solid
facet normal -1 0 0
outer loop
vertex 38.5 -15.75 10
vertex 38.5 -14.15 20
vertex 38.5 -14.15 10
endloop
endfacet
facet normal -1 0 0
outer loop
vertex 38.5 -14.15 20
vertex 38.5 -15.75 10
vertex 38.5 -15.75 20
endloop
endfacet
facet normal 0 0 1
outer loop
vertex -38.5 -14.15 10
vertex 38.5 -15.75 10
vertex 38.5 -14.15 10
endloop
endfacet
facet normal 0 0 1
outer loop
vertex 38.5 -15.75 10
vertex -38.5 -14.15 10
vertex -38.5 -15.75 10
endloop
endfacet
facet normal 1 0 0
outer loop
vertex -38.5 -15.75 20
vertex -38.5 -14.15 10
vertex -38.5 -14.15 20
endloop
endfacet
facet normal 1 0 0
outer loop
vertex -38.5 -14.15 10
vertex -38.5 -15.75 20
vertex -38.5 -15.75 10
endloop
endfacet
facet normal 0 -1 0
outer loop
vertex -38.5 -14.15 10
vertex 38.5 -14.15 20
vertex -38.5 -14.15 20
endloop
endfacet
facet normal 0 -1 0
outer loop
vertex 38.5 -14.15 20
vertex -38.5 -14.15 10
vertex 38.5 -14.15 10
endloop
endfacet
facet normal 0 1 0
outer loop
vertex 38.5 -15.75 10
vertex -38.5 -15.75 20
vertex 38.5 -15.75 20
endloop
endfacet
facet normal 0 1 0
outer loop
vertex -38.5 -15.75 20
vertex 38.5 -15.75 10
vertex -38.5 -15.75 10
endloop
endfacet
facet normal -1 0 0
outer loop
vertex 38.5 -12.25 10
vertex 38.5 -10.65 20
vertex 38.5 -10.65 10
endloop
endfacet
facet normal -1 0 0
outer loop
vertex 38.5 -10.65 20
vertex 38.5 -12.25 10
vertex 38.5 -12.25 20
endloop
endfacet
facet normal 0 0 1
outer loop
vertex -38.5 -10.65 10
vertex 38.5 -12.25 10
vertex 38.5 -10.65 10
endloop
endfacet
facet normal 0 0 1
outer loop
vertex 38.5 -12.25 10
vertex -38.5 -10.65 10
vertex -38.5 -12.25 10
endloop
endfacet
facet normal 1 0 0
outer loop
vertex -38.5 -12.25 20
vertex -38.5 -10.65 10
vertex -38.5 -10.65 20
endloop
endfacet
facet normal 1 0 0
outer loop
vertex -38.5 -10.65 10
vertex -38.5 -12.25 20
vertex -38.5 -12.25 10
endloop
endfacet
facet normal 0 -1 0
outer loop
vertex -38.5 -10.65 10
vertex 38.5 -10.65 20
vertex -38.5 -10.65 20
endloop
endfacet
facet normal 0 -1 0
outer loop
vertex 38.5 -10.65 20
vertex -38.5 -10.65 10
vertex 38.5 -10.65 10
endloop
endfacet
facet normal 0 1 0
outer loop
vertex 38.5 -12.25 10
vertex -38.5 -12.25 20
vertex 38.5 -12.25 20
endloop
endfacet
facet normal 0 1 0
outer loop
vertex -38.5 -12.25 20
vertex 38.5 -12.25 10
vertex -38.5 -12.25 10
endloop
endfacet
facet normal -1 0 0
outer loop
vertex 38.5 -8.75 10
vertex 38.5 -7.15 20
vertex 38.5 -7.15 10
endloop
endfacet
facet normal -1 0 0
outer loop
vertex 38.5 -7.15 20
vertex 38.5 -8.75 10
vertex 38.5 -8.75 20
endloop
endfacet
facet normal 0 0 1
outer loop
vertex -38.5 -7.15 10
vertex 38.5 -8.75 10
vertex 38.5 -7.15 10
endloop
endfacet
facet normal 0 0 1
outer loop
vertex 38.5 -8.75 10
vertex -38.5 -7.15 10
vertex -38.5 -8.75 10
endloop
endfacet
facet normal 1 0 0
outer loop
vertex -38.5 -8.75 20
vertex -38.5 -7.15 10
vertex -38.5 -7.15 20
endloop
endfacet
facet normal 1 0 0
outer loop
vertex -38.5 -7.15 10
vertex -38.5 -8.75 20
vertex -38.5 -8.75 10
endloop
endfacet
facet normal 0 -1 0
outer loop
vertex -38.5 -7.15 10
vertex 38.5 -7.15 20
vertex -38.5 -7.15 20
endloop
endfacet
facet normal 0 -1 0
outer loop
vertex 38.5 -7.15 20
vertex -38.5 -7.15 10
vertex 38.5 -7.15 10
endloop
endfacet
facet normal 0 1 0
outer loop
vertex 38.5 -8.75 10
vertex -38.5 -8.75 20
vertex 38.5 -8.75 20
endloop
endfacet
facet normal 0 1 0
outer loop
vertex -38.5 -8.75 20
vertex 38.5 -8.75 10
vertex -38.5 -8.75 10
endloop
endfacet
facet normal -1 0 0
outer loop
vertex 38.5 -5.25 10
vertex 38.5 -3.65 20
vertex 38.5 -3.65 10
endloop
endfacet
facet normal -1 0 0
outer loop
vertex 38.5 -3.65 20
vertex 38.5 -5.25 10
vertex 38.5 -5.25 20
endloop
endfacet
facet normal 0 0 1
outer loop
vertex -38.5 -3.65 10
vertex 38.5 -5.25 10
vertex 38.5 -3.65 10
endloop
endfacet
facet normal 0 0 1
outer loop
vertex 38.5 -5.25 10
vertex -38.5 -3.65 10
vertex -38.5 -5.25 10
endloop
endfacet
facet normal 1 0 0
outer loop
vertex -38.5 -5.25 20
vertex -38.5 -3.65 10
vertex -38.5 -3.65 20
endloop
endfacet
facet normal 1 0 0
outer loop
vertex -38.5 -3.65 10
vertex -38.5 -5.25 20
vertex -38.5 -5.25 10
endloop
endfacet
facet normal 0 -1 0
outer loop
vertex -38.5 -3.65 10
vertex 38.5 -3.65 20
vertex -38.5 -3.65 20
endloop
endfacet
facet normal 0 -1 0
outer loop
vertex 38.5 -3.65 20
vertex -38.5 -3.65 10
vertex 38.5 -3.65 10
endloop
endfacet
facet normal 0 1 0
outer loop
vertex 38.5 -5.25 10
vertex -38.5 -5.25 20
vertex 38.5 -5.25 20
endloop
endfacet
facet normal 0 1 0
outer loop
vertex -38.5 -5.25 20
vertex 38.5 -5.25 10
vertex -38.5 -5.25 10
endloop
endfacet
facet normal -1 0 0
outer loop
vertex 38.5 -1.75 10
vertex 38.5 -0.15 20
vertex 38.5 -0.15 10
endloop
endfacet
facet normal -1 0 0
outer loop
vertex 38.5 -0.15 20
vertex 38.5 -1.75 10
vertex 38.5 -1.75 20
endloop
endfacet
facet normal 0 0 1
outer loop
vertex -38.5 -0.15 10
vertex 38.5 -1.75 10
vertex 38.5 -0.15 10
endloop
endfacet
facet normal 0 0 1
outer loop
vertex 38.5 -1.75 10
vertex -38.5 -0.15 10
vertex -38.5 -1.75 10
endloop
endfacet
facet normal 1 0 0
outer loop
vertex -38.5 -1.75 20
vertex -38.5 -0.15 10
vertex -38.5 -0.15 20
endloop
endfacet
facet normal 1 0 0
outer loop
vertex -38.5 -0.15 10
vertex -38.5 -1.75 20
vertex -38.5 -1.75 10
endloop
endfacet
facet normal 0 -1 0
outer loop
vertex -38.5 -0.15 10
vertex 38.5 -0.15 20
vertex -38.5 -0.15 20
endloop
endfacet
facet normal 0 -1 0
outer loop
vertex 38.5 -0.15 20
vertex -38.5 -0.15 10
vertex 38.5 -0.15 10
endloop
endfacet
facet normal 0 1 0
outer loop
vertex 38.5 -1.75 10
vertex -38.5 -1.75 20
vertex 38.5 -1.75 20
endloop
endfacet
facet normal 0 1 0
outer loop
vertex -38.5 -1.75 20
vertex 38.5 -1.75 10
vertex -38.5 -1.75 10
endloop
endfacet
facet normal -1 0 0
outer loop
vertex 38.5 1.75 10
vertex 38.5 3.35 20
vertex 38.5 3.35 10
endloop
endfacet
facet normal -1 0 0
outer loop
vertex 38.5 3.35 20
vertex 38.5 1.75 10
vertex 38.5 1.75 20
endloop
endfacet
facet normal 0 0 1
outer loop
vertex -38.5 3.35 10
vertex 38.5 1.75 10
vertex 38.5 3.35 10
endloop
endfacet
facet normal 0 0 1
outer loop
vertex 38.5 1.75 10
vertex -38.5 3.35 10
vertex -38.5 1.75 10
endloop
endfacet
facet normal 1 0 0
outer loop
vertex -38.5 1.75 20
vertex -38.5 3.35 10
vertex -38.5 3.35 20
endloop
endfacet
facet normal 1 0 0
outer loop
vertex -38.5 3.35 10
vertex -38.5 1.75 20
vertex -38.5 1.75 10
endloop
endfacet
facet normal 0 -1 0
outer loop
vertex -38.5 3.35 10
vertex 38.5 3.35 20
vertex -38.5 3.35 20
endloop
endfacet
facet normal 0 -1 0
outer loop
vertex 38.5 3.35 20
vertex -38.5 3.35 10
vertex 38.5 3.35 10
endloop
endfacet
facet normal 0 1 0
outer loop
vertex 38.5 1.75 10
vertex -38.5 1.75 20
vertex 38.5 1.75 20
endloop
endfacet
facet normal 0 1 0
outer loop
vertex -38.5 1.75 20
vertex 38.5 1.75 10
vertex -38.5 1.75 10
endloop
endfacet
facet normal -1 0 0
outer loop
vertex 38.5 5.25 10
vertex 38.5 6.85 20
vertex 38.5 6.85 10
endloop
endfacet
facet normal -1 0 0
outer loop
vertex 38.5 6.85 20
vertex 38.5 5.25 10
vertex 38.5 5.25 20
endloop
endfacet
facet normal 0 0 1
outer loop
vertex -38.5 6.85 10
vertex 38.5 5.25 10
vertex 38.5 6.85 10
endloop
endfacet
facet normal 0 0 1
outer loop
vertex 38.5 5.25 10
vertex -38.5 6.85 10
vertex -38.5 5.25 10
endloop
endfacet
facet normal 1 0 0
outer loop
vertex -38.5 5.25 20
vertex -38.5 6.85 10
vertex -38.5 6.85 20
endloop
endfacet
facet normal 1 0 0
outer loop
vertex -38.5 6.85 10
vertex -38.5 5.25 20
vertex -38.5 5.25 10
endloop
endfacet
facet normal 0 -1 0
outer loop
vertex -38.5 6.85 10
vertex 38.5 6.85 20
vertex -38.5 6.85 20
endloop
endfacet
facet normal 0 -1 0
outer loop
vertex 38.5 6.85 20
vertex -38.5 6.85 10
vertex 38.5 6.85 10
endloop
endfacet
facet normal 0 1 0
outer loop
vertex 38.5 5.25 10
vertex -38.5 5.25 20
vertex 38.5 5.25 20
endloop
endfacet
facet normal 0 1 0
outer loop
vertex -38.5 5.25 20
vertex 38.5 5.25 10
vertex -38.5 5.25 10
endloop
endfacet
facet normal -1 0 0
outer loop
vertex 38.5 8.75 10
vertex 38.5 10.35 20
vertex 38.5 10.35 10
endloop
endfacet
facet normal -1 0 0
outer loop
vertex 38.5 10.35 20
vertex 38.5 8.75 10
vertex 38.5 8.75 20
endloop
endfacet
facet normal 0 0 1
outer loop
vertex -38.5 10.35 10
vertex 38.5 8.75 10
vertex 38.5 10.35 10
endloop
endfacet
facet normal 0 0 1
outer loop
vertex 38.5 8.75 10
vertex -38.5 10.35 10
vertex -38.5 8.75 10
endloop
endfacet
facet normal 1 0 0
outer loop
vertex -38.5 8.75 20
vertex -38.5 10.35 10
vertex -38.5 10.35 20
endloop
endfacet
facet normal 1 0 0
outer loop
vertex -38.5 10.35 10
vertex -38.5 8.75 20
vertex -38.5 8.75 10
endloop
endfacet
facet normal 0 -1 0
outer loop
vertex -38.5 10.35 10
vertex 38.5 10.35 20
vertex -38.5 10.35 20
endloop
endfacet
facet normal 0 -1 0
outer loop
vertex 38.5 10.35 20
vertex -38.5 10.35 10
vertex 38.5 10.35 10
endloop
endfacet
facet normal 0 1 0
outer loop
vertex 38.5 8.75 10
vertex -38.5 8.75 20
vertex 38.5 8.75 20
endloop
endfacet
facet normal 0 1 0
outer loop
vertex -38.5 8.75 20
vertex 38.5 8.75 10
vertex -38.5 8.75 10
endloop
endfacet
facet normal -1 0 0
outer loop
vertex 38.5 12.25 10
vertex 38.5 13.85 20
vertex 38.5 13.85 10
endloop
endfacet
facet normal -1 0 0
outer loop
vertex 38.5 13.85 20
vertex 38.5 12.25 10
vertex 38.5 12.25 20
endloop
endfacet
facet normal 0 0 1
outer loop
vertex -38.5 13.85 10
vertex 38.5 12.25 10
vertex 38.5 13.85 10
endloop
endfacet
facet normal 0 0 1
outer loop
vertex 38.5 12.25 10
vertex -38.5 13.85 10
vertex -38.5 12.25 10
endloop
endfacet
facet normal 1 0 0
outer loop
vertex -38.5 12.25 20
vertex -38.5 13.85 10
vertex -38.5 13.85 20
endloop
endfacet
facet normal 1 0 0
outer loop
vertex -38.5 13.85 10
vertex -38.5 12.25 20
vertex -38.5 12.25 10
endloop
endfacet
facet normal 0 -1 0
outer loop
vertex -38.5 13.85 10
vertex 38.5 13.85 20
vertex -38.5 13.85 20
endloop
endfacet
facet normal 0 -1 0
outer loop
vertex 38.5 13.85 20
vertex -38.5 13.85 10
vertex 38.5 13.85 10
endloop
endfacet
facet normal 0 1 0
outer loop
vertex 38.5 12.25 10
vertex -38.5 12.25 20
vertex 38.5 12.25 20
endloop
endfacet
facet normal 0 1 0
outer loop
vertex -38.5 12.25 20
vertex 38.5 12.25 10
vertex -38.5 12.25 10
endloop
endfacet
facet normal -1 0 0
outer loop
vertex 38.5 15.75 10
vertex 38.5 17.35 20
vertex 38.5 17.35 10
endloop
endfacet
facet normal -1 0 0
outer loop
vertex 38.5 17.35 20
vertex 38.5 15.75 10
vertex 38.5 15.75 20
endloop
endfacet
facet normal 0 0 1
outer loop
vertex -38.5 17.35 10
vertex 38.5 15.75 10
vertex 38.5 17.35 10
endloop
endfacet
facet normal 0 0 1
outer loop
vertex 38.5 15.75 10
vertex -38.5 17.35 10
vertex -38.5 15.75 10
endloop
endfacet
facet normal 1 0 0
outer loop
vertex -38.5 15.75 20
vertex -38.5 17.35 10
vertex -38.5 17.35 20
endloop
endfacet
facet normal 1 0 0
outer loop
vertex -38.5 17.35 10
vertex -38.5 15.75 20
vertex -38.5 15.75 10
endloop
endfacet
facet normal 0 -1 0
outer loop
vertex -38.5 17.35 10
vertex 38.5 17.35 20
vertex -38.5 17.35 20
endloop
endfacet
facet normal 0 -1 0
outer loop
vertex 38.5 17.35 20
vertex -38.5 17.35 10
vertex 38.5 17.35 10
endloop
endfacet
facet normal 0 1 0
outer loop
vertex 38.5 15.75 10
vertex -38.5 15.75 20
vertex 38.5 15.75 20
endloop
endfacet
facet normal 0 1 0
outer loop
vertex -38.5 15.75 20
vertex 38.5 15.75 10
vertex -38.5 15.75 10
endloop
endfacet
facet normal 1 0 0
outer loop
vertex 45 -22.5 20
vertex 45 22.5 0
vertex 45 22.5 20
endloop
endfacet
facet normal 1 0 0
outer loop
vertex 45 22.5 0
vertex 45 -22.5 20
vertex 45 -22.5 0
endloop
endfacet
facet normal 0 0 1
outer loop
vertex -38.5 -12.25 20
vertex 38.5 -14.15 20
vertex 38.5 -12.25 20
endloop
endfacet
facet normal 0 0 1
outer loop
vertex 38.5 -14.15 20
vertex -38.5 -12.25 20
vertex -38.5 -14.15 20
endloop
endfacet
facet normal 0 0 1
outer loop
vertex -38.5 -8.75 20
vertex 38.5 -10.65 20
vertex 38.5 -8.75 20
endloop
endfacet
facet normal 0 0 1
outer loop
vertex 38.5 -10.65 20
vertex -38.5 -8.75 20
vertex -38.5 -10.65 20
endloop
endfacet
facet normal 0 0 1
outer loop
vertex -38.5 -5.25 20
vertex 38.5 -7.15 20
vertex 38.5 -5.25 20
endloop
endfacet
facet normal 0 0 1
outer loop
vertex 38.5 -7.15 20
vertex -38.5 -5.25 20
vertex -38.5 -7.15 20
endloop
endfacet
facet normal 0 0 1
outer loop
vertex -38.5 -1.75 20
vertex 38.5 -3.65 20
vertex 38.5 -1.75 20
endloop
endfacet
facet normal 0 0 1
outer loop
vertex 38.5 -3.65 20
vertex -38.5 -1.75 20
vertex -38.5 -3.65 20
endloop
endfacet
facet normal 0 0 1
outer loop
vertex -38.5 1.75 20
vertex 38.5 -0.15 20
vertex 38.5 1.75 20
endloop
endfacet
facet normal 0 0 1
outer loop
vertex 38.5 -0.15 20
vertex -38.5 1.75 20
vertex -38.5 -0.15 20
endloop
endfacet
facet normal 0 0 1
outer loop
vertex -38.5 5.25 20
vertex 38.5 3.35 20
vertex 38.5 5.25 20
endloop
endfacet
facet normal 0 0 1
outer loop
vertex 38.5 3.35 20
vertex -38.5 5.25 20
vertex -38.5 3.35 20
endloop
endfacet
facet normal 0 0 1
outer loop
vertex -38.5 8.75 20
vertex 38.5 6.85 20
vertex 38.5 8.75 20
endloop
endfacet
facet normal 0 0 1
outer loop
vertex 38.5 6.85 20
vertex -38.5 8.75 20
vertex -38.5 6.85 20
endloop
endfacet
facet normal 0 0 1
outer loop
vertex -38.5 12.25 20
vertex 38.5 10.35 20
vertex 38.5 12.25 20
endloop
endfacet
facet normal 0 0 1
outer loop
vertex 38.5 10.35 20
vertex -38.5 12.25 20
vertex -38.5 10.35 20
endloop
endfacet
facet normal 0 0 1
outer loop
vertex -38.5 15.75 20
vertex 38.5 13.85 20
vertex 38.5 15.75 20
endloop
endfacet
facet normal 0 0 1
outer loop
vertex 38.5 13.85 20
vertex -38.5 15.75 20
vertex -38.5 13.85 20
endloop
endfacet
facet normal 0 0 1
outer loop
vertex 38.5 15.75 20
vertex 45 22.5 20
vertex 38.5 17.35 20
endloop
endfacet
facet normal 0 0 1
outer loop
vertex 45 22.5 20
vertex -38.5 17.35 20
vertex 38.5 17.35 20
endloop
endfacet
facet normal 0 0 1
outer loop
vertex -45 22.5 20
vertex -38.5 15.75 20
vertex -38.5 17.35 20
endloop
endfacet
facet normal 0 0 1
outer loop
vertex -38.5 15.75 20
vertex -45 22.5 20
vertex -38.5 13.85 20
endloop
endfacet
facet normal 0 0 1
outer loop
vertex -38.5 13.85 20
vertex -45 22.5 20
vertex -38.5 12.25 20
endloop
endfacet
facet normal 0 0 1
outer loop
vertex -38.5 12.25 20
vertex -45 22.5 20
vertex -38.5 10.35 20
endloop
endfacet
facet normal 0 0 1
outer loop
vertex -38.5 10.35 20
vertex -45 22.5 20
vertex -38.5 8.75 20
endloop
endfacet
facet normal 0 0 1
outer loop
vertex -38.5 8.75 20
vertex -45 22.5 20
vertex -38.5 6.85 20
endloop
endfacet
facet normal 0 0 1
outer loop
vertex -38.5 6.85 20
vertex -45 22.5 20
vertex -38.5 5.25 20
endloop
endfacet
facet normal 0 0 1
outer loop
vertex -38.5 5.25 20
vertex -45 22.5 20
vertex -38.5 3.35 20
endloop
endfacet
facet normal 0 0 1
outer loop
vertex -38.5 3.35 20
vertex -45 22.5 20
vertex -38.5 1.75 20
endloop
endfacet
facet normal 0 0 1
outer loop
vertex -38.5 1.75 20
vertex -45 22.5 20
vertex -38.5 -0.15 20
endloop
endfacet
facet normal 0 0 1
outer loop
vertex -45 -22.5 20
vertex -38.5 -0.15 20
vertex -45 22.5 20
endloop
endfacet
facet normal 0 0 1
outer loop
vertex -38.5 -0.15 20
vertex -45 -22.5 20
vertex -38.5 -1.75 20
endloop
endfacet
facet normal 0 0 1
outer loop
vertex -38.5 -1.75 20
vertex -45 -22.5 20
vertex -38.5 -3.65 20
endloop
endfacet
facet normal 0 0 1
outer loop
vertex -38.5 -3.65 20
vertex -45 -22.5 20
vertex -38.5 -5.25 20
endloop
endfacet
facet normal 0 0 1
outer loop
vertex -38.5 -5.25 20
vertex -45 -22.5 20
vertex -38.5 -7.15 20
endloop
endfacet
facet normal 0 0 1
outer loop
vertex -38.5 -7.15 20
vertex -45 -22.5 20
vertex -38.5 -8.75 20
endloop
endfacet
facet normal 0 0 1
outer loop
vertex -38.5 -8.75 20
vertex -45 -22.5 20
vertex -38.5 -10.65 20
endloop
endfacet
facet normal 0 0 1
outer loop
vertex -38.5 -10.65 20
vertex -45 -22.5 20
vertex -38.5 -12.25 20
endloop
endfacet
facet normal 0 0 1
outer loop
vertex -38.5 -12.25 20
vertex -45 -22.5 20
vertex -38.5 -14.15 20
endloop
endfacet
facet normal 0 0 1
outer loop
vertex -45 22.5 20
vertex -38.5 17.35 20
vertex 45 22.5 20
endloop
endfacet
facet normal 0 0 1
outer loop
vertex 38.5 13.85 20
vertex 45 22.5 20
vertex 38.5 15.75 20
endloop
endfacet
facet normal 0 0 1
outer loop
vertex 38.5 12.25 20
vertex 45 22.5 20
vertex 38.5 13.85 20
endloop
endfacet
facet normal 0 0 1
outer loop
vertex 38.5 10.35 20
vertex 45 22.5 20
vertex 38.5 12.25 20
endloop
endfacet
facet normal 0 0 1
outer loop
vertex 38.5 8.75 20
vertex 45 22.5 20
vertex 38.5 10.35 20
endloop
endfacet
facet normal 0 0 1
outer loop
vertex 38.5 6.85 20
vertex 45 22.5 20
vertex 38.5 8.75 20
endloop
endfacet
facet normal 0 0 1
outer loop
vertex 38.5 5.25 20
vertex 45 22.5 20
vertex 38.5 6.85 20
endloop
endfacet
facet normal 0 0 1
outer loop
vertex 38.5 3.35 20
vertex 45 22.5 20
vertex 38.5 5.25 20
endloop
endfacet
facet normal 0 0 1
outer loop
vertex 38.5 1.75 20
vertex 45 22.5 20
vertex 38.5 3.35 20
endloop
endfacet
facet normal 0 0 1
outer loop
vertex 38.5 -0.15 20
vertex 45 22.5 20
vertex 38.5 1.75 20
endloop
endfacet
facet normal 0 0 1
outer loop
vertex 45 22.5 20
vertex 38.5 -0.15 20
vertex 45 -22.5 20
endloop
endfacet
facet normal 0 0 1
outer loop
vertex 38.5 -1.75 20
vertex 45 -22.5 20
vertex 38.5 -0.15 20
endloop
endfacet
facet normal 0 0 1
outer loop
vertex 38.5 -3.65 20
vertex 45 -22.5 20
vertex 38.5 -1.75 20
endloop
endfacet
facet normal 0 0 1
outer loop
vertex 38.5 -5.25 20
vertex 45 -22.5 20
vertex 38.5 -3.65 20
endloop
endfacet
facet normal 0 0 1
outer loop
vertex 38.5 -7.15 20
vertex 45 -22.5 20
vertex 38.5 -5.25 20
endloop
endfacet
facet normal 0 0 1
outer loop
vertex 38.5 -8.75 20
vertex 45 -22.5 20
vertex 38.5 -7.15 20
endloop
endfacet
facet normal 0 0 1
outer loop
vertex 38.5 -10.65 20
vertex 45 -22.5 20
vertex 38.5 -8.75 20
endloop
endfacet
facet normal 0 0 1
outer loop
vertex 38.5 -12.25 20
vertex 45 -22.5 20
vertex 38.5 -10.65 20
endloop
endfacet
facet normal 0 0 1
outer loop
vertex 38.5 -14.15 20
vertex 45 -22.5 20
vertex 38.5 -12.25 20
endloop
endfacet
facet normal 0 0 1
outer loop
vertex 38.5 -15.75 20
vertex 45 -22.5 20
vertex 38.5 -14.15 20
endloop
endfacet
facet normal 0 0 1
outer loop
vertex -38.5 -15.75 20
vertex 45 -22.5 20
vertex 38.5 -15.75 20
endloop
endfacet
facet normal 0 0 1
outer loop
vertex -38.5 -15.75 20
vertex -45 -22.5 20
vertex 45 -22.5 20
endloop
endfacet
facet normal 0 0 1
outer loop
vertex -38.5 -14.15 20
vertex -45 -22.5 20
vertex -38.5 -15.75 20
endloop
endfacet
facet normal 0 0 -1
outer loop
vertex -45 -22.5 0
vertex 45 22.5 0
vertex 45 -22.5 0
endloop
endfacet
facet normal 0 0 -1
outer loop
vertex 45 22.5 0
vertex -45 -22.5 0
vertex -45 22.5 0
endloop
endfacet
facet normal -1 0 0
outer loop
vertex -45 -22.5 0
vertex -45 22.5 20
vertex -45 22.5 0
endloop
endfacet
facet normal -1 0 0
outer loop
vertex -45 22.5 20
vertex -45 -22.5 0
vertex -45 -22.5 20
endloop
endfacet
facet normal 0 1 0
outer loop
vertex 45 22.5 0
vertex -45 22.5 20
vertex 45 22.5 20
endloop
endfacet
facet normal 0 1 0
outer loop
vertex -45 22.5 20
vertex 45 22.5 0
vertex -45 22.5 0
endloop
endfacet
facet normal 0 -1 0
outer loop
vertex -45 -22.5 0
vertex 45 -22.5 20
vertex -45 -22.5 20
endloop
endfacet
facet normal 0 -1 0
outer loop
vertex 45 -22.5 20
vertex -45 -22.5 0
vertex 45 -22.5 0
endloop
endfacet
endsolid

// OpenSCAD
// Microscope slide drying rack
// Units: mm

// ---- Block ----
block_len   = 90;    // block length (X)
block_wid   = 45;    // block width (Y)
block_ht    = 20;    // block height (Z)

// ---- Slots ----
slot_count  = 10;    // number of slide slots
slot_len    = 77;    // slot length along X
slot_wid    = 1.6;   // slot width along Y
slot_depth  = 10;    // slot depth from top face
slot_pitch  = 3.5;   // centre-to-centre spacing along Y

// ---- Misc ----
eps         = 0.5;   // cutter overshoot past top face
$fn         = 64;

difference() {
    // Base block, centred in X/Y, resting on z = 0
    translate([-block_len/2, -block_wid/2, 0])
        cube([block_len, block_wid, block_ht]);

    // Row of parallel slots, centred on the block
    for (i = [0 : slot_count - 1]) {
        y = (i - (slot_count - 1)/2) * slot_pitch;
        translate([-slot_len/2, y, block_ht - slot_depth])
            cube([slot_len, slot_wid, slot_depth + eps]);
    }
}
